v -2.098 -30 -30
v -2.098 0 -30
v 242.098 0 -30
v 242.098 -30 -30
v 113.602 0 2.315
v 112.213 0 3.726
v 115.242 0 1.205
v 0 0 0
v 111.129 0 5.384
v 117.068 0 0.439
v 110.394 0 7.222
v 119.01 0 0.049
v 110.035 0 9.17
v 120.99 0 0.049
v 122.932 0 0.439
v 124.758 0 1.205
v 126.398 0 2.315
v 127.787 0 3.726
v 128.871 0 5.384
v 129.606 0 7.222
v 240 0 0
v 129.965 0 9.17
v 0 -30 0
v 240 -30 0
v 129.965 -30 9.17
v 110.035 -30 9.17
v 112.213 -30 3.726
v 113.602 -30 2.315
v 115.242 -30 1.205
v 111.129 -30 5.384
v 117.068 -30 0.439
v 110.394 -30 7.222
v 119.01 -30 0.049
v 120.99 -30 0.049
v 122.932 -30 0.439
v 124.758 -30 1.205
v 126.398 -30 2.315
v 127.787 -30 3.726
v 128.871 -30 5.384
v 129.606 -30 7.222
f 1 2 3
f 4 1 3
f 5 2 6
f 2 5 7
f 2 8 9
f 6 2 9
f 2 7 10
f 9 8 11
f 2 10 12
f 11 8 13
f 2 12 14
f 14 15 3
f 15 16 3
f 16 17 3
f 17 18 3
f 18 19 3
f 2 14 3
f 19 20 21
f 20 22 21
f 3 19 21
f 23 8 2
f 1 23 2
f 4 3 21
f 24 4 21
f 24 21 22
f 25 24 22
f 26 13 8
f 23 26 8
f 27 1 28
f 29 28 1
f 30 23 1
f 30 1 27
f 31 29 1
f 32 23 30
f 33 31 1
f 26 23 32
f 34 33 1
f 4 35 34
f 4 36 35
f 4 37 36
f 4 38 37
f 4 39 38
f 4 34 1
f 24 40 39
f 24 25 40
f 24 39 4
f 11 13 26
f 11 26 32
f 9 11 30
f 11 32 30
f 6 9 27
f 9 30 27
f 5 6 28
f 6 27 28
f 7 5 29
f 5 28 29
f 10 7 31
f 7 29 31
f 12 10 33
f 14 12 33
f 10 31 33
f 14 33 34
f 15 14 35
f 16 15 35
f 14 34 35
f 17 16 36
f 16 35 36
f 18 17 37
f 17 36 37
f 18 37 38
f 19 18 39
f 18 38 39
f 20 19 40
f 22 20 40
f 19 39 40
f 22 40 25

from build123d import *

# Parameters (mm, degrees)
F1_DEPTH = 30
F2_R     = 10
F3_DEPTH = 30


with BuildPart() as f1:
    # F0 (on Front) → F1 (new body)
    with BuildSketch(Plane.XZ):
        Polygon((120, 10), (0, 0), (240, 0), align=None)
        Polygon((240, 0), (0, 0), (-2.097804, -30), (120, -30), (242.097804, -30), align=None)
    extrude(amount=F1_DEPTH)

    # F2 (on face) → F3 (cut)
    with BuildSketch(Plane.XZ.offset(30)):
        with Locations((120, 10)):
            Circle(F2_R)
    extrude(amount=-F3_DEPTH, mode=Mode.SUBTRACT)


solid = f1.part
